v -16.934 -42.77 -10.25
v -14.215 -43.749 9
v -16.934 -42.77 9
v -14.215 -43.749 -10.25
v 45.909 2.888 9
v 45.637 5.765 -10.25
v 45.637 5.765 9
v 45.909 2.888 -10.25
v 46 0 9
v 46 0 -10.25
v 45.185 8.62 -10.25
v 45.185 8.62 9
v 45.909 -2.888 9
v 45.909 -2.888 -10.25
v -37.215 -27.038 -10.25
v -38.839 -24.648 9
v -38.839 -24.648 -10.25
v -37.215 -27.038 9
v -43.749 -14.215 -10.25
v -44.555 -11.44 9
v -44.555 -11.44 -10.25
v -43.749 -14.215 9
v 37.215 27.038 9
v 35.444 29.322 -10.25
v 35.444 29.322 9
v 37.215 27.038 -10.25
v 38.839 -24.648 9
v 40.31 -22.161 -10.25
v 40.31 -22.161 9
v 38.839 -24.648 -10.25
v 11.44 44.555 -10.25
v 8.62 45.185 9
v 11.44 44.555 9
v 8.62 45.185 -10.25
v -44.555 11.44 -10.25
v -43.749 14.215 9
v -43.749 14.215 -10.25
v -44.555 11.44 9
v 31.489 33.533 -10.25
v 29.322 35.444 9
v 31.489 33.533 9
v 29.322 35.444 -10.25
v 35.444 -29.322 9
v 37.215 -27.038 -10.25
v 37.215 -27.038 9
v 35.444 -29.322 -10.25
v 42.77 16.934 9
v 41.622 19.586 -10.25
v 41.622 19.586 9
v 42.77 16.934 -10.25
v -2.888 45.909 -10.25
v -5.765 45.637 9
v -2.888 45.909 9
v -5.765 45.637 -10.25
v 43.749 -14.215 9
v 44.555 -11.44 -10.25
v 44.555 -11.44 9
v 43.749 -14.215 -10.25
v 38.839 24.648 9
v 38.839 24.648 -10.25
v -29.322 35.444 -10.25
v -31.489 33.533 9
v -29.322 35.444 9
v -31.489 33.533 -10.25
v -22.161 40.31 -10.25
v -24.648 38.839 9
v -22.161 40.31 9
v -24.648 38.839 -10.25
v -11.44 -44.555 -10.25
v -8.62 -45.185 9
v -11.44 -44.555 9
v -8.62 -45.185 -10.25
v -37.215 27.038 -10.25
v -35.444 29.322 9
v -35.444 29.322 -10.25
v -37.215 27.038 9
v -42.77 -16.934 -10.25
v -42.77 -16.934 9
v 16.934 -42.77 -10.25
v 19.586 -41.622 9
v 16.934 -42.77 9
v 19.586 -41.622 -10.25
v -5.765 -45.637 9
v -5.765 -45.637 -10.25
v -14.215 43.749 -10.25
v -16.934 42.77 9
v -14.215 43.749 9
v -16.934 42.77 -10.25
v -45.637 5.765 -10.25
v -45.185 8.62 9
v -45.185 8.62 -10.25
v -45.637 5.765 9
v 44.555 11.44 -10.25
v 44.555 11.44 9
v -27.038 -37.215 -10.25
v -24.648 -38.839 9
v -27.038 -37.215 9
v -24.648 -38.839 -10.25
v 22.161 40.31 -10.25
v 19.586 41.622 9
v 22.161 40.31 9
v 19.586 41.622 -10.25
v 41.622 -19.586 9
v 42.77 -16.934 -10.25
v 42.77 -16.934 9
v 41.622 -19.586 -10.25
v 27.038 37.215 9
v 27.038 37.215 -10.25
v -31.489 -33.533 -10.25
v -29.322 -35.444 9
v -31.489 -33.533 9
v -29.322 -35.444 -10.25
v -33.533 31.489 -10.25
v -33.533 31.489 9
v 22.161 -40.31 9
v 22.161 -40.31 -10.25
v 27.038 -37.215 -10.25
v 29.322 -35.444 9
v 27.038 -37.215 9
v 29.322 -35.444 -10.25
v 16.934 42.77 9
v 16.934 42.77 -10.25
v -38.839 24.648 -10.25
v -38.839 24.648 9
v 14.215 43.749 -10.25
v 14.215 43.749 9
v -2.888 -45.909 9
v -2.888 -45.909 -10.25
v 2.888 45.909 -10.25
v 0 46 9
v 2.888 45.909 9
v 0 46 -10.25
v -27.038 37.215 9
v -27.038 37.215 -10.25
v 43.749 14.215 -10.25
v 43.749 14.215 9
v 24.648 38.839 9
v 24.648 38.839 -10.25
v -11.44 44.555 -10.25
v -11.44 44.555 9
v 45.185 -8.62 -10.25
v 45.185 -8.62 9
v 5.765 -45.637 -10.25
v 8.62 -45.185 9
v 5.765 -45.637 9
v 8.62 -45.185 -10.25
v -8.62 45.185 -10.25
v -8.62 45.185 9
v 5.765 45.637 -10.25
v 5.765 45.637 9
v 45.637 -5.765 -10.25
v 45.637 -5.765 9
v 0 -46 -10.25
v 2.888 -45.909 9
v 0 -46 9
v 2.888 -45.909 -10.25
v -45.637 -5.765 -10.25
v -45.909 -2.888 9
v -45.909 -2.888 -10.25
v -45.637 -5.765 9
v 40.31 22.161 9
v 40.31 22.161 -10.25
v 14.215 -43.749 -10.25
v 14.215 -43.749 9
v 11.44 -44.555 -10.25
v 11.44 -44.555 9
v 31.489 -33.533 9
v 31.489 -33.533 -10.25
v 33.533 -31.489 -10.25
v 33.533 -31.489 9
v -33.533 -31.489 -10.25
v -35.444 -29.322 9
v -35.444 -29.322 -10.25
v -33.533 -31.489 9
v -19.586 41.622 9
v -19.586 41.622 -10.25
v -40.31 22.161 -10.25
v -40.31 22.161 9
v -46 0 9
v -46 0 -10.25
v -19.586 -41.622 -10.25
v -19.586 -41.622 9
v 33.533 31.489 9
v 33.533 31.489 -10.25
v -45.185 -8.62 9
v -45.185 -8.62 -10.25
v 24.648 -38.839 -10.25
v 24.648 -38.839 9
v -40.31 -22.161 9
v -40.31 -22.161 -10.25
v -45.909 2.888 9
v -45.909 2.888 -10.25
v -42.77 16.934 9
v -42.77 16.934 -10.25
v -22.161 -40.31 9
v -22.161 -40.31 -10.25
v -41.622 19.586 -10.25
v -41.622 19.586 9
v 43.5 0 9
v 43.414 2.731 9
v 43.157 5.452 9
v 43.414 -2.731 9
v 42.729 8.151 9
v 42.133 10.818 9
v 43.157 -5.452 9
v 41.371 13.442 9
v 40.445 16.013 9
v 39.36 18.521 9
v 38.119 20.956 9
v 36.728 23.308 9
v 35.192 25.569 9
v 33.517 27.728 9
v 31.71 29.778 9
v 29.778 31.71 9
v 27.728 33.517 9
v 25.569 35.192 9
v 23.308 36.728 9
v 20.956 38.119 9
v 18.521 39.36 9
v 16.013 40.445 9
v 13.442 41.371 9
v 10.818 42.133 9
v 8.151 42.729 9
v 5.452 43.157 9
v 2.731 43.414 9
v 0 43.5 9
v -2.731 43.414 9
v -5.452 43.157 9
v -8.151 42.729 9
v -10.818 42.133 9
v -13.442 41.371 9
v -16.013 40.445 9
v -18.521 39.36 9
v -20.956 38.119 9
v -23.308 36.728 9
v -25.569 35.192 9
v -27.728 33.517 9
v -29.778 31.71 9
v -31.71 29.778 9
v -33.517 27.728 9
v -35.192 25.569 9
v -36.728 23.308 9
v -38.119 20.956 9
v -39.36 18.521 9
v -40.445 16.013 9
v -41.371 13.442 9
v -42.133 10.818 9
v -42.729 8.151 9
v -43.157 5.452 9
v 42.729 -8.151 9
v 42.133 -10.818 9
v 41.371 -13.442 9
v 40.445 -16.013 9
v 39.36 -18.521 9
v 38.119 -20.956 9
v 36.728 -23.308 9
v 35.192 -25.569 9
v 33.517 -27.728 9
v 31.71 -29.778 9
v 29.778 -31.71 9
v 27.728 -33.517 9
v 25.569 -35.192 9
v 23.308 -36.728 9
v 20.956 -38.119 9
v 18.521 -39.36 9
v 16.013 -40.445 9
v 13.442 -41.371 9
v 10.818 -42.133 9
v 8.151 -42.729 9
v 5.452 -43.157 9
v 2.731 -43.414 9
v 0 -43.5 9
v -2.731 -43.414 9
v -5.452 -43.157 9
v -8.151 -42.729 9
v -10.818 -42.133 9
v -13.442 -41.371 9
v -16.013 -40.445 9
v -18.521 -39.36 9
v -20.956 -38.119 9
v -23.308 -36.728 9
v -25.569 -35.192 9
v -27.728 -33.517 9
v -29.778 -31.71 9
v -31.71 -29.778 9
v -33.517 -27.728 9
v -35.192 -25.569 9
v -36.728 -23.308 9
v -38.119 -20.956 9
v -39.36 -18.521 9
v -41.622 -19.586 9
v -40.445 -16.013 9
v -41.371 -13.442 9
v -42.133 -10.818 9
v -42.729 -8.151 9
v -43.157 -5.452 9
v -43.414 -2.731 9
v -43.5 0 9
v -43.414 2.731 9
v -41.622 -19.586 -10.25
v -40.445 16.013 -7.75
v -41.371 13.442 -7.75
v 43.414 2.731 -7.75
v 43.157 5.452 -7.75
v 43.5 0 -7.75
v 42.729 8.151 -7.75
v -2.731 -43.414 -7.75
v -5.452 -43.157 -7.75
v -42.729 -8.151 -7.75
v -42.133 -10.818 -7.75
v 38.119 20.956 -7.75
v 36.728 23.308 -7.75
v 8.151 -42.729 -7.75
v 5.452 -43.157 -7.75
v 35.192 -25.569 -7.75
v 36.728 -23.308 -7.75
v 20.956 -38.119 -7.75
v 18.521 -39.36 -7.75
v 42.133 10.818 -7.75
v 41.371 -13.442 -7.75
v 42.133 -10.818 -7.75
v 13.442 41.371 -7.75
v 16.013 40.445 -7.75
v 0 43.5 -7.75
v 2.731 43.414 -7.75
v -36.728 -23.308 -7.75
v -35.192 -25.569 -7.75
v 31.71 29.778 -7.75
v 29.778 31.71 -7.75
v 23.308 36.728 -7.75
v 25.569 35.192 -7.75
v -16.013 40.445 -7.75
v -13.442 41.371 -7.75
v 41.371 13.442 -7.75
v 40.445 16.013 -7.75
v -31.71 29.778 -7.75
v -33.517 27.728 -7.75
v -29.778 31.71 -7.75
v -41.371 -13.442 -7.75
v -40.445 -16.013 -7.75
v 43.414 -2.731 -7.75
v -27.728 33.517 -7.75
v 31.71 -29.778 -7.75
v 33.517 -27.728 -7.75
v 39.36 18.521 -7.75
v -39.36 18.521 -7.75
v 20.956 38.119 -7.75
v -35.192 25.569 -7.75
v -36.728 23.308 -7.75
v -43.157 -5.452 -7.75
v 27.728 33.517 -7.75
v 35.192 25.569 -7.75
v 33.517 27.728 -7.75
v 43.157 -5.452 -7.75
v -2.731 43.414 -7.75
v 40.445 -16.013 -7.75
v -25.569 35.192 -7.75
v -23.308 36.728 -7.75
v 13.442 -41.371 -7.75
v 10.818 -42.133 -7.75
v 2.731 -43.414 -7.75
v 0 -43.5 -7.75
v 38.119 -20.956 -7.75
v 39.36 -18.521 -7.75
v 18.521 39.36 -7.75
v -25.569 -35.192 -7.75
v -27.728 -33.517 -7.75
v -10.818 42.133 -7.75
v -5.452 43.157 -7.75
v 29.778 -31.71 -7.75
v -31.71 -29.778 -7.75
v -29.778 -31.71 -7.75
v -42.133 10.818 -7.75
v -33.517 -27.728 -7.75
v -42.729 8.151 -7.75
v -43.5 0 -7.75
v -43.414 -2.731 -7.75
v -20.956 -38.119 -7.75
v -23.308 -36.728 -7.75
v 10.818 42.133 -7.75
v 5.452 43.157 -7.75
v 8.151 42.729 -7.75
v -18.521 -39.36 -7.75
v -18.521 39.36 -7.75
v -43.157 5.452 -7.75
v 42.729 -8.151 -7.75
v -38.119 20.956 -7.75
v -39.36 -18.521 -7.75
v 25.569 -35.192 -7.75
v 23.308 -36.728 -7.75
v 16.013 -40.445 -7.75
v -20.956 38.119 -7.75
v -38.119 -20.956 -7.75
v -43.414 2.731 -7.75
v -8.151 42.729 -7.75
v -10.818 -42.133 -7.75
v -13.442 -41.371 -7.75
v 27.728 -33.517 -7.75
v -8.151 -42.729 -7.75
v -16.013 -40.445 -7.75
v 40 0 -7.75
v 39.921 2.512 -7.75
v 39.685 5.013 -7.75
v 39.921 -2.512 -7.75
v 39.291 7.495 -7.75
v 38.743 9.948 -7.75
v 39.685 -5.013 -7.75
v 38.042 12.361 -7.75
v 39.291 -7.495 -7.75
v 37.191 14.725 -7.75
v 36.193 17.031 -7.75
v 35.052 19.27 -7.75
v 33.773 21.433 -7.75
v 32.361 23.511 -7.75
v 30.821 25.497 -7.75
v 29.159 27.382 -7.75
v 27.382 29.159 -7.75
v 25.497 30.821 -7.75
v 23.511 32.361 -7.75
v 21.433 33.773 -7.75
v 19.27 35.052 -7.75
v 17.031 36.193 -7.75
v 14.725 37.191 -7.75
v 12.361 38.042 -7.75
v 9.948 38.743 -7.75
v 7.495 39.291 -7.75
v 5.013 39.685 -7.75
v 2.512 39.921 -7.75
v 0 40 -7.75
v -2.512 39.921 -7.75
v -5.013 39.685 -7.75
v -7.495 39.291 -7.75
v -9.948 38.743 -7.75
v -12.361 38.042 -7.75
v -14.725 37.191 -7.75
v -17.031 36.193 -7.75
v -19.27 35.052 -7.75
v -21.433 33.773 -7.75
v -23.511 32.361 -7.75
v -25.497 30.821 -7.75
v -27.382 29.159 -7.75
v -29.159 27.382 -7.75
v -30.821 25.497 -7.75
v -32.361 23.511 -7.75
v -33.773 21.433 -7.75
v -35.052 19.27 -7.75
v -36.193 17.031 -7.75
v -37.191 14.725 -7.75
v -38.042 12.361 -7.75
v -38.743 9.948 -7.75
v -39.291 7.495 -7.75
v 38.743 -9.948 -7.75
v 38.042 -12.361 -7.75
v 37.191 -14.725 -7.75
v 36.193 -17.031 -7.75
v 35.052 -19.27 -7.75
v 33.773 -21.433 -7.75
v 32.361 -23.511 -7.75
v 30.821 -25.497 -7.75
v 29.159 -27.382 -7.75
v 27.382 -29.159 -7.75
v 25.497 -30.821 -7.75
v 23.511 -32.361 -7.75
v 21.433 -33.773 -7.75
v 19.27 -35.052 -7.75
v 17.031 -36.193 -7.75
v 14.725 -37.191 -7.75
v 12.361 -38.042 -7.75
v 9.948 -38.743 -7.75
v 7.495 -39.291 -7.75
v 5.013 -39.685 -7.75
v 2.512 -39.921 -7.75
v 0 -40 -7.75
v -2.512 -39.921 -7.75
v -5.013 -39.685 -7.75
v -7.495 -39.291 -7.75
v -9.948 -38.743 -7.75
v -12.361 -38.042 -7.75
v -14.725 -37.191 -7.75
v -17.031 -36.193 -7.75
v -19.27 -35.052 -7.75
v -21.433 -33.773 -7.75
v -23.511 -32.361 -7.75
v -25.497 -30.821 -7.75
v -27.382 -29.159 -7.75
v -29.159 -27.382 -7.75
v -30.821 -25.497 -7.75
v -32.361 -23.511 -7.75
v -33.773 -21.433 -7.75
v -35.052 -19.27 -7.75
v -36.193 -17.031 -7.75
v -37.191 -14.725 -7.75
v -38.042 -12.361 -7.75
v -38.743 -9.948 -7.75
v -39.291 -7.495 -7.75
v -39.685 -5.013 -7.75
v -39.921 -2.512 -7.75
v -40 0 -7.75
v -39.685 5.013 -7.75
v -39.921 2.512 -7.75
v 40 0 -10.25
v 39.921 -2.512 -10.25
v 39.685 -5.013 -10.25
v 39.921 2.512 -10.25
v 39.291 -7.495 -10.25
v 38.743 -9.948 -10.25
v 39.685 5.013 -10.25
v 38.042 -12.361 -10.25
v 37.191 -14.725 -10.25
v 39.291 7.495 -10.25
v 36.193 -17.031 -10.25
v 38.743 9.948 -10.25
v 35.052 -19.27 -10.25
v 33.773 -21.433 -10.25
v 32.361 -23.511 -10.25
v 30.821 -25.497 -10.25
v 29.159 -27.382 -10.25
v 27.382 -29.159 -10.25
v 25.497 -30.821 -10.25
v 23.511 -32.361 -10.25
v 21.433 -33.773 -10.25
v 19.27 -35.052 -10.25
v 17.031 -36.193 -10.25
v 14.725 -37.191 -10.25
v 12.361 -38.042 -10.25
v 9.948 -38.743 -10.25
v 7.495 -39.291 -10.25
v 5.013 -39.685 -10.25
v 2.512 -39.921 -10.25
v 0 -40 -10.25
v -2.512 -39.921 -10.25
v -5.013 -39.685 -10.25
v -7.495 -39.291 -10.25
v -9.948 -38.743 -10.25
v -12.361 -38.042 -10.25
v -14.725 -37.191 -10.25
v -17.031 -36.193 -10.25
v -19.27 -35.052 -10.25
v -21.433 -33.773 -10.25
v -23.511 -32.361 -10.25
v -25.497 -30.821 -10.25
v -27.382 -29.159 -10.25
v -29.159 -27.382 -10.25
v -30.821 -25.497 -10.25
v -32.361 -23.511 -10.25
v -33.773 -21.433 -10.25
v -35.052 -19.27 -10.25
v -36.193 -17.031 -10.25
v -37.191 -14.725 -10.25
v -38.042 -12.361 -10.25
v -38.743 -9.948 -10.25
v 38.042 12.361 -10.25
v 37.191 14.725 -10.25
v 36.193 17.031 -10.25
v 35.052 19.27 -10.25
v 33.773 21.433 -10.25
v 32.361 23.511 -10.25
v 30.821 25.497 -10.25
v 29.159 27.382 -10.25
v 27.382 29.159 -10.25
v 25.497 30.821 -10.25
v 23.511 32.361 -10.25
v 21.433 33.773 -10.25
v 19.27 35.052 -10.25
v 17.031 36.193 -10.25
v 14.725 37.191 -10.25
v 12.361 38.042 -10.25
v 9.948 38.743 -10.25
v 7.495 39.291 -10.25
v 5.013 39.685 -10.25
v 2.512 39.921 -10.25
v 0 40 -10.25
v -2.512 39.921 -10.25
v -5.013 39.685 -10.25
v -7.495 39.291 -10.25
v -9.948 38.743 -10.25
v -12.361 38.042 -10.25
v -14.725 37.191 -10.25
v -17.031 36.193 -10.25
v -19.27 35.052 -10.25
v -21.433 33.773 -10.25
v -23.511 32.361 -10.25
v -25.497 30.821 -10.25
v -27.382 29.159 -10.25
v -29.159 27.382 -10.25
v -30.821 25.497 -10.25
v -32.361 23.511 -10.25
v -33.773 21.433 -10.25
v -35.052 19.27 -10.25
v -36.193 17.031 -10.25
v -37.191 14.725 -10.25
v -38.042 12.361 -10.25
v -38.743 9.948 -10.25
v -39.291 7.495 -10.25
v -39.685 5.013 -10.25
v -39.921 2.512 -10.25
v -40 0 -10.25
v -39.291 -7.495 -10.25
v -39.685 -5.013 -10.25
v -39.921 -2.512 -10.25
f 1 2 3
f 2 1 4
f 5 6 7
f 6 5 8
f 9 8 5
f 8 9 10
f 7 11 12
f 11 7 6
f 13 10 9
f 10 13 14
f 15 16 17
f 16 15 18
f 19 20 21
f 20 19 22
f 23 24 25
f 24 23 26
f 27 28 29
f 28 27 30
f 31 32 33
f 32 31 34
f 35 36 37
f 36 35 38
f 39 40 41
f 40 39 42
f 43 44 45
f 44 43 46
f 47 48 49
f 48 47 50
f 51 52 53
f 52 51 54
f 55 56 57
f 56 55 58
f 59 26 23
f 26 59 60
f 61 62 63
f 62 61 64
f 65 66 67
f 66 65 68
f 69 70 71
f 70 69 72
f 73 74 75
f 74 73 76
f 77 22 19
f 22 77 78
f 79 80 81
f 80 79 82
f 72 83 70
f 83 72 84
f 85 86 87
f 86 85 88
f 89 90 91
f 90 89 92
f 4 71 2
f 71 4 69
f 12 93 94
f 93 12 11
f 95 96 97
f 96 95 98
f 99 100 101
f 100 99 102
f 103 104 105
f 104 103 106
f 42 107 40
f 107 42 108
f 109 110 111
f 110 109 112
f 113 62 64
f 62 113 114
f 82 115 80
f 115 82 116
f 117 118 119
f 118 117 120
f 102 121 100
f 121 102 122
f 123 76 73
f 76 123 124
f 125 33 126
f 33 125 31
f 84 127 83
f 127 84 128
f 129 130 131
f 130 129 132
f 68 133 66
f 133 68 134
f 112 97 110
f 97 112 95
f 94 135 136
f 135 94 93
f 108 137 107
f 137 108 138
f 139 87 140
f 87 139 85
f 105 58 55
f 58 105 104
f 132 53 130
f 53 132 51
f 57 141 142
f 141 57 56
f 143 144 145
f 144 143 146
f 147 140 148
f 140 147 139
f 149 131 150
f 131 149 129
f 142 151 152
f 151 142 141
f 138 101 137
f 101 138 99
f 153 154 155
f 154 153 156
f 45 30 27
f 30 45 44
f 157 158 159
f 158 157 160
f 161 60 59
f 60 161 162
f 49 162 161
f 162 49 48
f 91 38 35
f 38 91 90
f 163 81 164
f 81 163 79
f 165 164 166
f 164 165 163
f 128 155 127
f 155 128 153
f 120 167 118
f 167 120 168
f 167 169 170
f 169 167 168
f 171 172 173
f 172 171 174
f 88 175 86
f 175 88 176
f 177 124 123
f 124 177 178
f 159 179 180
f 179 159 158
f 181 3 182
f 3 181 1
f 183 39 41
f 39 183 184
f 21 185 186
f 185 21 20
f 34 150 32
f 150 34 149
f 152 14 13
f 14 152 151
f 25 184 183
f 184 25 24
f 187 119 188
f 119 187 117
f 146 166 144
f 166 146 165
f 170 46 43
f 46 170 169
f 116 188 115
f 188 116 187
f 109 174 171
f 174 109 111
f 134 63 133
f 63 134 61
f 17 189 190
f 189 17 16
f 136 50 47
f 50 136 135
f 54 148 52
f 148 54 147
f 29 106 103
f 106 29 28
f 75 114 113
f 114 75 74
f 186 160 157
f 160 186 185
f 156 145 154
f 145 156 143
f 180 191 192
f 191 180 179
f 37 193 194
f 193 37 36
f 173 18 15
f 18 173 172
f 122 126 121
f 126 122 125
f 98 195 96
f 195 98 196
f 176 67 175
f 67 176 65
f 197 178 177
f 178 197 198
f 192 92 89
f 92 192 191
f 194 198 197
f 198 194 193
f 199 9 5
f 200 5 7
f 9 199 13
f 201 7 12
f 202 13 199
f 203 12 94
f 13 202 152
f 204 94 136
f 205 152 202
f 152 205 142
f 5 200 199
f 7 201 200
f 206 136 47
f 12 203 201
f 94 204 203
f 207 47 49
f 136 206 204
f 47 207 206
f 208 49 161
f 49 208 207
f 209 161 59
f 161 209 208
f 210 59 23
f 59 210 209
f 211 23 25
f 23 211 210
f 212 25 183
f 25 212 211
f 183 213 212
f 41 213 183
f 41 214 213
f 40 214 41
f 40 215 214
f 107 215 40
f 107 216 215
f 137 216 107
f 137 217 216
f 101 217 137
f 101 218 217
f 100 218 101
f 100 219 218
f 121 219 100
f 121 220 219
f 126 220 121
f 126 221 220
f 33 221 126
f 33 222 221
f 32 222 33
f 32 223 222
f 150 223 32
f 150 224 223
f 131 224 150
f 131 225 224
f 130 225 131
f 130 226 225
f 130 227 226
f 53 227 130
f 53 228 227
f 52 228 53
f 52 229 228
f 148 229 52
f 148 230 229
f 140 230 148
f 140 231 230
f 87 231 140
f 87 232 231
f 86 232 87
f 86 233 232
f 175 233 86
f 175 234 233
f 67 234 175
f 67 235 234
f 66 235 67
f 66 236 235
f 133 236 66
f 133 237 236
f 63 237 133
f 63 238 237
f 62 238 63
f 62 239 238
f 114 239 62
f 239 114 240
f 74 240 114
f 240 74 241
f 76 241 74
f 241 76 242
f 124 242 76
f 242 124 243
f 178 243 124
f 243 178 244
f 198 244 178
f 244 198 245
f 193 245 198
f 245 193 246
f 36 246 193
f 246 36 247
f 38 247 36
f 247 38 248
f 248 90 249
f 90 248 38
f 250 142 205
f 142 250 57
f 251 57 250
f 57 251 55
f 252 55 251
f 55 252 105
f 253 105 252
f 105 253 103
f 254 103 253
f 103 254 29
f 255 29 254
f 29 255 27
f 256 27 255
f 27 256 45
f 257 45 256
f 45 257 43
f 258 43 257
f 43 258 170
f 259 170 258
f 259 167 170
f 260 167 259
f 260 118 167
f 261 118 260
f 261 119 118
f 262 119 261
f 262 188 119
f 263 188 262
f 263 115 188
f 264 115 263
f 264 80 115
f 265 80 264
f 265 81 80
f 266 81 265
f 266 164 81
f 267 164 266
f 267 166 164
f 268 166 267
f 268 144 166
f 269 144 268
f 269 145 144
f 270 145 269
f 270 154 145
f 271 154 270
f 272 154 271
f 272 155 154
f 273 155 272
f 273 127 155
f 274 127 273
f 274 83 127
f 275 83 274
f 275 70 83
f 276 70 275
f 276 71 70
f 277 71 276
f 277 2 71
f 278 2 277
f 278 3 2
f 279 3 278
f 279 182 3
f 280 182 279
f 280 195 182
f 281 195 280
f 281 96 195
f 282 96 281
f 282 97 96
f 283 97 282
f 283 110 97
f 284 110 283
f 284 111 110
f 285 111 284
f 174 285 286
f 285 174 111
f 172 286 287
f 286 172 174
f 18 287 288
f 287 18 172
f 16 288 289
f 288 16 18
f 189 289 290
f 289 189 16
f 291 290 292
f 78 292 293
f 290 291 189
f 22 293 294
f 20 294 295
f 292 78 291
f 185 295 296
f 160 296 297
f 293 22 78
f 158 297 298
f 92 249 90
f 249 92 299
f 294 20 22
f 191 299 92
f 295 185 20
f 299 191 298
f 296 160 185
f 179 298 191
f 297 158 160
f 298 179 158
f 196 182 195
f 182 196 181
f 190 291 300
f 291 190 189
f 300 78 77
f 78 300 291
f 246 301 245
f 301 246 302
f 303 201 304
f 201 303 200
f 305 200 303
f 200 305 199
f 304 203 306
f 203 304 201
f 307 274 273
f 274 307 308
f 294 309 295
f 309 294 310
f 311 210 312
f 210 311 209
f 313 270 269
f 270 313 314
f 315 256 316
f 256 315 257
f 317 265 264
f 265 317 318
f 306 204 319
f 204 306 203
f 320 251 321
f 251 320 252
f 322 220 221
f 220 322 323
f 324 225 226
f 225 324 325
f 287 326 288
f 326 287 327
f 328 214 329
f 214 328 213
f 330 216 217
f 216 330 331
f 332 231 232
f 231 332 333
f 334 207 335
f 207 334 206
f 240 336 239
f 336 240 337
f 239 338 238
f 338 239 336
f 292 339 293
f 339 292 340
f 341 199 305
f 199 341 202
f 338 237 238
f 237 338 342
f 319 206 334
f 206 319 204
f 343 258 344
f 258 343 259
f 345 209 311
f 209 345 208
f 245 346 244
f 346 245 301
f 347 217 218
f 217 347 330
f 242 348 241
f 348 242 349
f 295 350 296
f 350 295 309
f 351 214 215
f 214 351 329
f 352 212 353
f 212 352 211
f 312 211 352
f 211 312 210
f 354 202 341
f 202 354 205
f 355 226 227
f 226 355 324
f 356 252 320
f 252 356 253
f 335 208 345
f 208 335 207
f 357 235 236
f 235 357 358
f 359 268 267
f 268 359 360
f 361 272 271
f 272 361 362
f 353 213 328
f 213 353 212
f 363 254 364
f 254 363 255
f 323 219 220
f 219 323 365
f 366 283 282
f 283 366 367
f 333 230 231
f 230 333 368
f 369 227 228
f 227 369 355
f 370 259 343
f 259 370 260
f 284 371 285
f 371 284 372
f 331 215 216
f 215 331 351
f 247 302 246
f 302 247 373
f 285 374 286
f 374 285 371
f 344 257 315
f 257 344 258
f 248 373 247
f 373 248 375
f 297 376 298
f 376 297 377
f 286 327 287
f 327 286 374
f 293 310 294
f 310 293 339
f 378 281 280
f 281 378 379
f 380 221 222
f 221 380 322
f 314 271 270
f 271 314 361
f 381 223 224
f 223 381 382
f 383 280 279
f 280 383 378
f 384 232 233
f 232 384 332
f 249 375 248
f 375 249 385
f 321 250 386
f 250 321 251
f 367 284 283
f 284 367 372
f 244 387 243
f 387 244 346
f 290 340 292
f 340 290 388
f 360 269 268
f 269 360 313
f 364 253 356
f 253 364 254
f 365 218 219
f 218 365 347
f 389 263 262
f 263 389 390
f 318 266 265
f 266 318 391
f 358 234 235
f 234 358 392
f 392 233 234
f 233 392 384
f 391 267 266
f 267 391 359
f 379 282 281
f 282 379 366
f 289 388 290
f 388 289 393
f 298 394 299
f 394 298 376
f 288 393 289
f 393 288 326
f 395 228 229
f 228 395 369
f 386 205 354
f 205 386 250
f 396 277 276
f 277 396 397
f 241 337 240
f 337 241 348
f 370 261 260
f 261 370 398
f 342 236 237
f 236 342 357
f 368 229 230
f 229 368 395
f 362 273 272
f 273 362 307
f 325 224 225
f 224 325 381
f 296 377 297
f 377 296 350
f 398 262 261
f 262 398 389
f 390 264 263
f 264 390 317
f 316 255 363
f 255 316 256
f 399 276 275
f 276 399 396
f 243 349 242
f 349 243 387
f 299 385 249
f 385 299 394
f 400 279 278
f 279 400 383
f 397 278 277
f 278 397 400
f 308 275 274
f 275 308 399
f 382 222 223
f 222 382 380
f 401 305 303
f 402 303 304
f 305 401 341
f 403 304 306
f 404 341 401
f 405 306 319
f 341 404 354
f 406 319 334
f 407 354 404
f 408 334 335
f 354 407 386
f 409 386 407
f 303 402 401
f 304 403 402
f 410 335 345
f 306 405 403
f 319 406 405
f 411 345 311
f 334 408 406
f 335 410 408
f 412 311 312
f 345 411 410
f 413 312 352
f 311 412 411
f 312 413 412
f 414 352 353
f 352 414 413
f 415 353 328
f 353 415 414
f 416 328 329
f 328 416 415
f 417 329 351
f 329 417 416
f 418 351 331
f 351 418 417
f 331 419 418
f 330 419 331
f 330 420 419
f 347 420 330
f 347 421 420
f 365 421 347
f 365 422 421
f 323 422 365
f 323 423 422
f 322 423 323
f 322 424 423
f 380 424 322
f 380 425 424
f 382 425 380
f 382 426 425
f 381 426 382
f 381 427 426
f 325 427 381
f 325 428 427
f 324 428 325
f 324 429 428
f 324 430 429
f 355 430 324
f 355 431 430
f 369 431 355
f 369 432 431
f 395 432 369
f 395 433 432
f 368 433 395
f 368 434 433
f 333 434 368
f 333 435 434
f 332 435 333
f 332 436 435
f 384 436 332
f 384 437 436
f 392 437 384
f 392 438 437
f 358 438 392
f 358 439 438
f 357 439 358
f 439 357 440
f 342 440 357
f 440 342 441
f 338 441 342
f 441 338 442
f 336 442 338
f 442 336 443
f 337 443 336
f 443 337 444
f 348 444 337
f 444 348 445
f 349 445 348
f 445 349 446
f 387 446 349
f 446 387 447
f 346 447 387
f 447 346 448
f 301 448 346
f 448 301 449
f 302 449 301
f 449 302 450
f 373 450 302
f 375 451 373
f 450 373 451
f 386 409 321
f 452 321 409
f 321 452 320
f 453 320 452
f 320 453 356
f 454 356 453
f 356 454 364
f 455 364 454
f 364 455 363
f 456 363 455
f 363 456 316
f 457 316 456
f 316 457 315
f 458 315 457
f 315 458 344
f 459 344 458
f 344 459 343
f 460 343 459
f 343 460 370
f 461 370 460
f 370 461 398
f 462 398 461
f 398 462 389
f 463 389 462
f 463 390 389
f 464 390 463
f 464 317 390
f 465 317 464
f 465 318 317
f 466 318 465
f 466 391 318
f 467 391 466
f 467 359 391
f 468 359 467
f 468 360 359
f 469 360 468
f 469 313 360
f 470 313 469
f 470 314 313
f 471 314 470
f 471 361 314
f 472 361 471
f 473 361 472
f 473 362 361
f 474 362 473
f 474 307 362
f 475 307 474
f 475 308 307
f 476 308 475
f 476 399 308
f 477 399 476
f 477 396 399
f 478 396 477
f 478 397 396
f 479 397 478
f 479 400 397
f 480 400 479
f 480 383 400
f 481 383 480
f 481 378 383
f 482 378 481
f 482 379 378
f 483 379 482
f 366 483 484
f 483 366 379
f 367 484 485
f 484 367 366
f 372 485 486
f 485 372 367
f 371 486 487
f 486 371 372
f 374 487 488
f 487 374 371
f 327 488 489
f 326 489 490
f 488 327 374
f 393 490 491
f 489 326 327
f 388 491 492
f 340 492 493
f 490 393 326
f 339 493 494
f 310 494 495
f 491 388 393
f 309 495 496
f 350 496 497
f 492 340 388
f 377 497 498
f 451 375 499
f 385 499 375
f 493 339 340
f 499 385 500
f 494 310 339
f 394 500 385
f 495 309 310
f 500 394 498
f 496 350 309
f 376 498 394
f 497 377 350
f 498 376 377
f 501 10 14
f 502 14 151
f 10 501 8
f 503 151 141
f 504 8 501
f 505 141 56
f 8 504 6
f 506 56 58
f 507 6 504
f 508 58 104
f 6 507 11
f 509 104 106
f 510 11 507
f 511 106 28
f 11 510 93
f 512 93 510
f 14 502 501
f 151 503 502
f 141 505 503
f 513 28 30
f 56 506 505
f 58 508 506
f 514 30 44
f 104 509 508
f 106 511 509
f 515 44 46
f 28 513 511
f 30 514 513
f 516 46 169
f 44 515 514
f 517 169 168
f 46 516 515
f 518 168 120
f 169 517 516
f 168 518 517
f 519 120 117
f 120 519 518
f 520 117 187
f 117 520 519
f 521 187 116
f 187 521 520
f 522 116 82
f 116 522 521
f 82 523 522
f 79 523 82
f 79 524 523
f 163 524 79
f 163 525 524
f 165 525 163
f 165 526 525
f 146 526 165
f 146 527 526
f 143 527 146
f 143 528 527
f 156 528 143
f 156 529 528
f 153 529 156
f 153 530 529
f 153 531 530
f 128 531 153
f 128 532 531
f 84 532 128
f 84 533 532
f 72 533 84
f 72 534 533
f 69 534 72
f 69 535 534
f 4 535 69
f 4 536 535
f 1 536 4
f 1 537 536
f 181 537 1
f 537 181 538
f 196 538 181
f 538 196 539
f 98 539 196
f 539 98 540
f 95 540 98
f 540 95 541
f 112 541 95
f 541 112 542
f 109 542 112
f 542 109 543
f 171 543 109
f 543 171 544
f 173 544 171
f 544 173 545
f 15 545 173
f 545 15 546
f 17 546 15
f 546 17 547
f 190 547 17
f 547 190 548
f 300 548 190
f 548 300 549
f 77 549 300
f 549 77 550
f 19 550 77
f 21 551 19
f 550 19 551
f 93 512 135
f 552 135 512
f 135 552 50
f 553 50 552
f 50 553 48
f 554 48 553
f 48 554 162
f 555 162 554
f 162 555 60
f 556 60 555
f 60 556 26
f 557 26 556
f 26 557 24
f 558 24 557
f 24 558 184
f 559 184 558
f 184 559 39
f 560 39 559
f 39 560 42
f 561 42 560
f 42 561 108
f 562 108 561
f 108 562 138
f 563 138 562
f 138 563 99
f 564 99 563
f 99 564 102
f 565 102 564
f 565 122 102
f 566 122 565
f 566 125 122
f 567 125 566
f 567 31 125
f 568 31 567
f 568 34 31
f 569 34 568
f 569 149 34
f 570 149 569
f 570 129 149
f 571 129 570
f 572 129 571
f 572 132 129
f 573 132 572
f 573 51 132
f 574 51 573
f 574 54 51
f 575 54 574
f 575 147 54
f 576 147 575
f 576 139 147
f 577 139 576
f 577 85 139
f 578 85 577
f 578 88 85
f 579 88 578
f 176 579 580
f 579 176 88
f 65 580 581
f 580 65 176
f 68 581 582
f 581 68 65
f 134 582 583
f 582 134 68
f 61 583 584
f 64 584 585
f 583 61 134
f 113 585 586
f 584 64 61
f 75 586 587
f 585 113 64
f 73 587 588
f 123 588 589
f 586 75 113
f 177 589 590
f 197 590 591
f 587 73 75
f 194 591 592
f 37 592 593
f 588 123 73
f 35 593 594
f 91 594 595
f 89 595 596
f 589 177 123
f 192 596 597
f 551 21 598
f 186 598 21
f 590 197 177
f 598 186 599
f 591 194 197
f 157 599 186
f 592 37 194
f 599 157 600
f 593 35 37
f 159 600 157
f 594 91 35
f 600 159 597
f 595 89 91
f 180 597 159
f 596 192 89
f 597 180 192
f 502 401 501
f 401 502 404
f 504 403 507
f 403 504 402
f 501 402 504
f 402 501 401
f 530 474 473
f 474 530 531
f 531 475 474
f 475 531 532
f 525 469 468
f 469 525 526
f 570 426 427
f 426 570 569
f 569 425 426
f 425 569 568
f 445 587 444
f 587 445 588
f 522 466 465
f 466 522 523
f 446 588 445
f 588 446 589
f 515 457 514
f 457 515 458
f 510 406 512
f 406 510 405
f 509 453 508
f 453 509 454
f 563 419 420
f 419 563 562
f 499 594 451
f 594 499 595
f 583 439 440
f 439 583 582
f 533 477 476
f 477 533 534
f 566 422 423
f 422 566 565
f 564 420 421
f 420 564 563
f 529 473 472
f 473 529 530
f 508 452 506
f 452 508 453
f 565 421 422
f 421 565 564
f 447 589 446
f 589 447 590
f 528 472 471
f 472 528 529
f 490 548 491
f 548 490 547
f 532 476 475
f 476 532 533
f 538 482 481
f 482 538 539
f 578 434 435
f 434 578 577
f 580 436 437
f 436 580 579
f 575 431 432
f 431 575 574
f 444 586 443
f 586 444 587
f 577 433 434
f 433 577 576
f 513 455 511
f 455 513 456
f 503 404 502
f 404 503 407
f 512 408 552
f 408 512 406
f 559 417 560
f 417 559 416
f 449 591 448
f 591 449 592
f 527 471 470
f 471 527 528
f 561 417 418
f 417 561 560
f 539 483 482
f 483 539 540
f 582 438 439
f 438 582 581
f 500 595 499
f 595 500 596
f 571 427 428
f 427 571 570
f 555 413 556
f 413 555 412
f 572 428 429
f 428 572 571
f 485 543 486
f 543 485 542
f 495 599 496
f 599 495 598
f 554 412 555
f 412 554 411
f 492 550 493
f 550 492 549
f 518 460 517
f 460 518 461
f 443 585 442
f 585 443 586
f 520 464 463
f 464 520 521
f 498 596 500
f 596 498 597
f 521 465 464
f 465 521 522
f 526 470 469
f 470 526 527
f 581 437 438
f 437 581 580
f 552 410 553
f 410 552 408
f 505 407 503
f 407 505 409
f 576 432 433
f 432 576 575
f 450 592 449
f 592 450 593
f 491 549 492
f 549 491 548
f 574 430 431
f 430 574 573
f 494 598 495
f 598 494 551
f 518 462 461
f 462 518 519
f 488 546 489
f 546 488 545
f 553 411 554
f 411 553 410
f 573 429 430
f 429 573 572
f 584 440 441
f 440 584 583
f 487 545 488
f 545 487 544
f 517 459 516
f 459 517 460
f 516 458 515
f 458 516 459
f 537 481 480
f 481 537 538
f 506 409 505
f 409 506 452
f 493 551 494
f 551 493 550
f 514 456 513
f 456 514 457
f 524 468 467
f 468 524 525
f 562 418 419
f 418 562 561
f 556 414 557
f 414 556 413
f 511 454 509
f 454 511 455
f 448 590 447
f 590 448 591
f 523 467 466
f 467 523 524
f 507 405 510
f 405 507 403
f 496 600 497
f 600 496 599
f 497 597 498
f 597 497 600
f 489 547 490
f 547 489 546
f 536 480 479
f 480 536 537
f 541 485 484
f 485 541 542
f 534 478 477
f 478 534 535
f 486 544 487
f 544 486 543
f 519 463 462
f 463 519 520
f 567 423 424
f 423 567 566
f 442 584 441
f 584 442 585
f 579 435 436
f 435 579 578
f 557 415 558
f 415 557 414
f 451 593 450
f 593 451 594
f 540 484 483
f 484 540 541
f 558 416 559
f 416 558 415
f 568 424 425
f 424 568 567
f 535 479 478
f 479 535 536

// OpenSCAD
radius_cylinder=40; 
radius_cylinder2=radius_cylinder+6; 

$fn=100; 



difference() {
	cylinder (h = 18, r=radius_cylinder2, center = true);
    cylinder (h = 82, r=radius_cylinder2-2.5, center = true);
}

translate([0,0,-9])
difference() {
	cylinder (h = 2.5, r=radius_cylinder2, center = true);
    cylinder (h = 2.6, r=radius_cylinder, center = true);
}
